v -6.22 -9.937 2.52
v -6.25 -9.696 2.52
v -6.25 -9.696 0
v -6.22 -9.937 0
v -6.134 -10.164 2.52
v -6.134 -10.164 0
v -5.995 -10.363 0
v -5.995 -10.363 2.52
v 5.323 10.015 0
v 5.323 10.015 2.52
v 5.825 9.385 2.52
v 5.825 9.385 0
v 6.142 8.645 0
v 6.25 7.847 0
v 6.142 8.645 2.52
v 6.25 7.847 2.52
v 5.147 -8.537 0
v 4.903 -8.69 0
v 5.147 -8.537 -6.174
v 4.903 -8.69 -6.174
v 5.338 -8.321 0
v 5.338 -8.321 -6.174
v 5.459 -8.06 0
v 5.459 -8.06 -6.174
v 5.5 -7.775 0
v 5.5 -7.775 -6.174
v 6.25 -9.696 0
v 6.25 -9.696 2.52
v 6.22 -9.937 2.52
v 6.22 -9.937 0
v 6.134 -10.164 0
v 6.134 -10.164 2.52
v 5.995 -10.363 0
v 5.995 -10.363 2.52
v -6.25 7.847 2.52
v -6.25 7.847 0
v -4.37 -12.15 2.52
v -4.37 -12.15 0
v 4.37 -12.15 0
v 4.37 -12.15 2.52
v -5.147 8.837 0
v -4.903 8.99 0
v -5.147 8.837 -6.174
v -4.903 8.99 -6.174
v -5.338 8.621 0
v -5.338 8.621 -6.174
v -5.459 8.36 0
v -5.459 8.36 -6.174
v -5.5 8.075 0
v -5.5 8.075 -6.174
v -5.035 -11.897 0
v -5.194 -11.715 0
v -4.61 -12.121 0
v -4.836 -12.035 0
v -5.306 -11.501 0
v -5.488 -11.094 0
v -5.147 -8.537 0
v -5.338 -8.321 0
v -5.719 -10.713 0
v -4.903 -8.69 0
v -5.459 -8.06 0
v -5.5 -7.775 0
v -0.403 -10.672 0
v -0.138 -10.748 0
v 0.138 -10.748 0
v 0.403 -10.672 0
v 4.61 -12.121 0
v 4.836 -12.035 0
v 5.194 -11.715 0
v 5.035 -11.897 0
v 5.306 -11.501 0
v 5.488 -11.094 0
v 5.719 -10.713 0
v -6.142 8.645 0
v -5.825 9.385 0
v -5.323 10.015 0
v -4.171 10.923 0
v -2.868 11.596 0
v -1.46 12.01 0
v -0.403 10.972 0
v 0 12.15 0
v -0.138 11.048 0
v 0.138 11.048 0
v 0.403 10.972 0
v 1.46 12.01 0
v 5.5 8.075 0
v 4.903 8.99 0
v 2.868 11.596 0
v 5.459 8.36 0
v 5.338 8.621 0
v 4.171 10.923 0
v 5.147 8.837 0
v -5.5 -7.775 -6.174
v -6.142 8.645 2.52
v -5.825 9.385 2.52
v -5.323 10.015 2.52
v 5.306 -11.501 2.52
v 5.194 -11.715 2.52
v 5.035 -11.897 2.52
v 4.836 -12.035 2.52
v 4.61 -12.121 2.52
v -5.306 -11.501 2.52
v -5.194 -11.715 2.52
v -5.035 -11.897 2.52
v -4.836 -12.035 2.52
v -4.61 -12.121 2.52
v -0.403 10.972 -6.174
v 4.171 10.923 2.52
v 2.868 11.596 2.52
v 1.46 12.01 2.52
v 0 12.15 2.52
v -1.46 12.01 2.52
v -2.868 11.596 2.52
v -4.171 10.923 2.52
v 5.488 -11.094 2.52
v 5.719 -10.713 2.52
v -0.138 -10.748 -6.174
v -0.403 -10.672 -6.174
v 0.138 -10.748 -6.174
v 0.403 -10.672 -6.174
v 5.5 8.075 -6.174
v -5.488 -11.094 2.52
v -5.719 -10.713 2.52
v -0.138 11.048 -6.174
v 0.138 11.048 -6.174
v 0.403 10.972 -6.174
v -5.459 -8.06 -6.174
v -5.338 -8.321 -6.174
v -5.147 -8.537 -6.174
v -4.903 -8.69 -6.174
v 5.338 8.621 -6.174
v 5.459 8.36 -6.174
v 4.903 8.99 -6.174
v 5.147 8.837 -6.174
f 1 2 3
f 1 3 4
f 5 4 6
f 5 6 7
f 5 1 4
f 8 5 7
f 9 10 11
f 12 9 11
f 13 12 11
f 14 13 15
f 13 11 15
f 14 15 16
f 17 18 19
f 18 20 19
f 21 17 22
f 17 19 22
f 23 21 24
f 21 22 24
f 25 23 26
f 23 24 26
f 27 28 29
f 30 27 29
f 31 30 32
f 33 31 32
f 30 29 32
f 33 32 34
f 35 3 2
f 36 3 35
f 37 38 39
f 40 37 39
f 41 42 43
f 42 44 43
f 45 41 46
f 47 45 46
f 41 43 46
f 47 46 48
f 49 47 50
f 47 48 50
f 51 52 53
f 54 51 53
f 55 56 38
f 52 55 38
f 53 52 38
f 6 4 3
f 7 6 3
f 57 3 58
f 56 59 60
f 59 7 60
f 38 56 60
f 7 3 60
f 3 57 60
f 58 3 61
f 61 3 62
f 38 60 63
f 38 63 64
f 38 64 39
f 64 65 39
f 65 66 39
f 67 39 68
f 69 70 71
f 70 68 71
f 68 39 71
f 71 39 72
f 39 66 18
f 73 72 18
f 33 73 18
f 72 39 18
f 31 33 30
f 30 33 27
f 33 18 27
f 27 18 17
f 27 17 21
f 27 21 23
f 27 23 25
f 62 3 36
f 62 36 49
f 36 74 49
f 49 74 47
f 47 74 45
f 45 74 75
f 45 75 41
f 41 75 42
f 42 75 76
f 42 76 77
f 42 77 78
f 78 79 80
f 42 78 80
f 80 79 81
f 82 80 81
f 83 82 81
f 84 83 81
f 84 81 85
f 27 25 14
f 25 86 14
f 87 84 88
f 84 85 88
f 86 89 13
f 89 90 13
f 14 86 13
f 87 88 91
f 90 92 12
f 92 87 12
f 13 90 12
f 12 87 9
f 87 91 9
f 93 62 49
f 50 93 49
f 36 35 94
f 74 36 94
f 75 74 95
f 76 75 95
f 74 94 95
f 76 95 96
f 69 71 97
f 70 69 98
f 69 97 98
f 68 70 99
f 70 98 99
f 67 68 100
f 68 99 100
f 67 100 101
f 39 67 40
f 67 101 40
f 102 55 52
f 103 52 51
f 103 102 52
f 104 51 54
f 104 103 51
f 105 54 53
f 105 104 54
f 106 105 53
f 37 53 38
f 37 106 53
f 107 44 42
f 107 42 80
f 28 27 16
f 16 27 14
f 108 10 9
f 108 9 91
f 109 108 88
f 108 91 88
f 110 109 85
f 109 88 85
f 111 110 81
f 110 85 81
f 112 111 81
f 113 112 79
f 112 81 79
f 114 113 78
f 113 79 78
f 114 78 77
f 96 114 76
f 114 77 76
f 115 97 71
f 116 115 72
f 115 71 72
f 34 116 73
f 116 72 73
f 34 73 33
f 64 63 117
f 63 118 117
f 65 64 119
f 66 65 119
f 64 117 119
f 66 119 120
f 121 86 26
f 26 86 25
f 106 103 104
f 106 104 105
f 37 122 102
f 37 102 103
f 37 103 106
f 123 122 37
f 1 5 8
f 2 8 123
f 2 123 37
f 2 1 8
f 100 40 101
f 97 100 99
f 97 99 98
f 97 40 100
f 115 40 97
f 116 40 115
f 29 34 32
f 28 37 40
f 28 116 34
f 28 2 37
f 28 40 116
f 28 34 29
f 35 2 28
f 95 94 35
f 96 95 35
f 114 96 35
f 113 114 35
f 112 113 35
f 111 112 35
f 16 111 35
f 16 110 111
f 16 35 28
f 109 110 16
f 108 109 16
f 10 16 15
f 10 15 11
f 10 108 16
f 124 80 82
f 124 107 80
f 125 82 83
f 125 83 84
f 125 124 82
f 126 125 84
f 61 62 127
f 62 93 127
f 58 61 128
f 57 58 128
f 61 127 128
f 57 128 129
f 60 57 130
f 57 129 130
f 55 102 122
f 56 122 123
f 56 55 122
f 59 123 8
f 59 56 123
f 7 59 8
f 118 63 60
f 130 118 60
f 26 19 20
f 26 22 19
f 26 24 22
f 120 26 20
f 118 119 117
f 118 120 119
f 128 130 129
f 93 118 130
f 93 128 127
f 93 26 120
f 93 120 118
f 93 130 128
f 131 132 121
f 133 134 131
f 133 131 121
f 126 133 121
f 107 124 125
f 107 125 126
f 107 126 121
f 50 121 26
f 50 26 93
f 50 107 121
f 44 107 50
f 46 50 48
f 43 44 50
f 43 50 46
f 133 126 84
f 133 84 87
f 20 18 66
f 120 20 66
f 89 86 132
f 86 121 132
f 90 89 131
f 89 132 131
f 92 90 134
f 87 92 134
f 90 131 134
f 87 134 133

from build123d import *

# Parameters (mm, degrees)
SKICA1_W                 = 12.5
SKICA1_H                 = 24.3
P_IDAT_VYSUNUT_M1_DEPTH  = 4.52
ODEBRAT_VYSUNUT_M1_DEPTH = 4.52
ODEBRAT_VYSUNUT_M2_DEPTH = 4.52
ZAOBLIT1_R               = 1
ZAOBLIT2_R               = 3
P_IDAT_VYSUNUT_M2_DEPTH  = 6.174
ZAOBLIT4_R               = 1
ODEBRAT_VYSUNUT_M3_DEPTH = 2


with BuildPart() as part:
    # Skica1 → Přidat vysunutím1 (new body)
    with BuildSketch(Plane.XY):
        Rectangle(SKICA1_W, SKICA1_H)
    extrude(amount=P_IDAT_VYSUNUT_M1_DEPTH)

    # Skica2 → Odebrat vysunutím1 (cut)
    with BuildSketch(Plane(origin=(0, 0, 0), x_dir=(-1, 0, 0), z_dir=(0, 0, -1))):
        with BuildLine():
            Line((-6.25, 12.15), (-6.25, 8.95))
            ThreePointArc((-6.25, 8.95), (-3.510786949, 11.303490134), (0, 12.15))
            Line((0, 12.15), (-6.25, 12.15))
        make_face()
        with BuildLine():
            Line((6.25, 12.15), (0, 12.15))
            ThreePointArc((0, 12.15), (3.510786949, 11.303490134), (6.25, 8.95))
            Line((6.25, 8.95), (6.25, 12.15))
        make_face()
    extrude(amount=-ODEBRAT_VYSUNUT_M1_DEPTH, mode=Mode.SUBTRACT)

    # Skica3 → Odebrat vysunutím2 (cut)
    with BuildSketch(Plane(origin=(0, 0, 0), x_dir=(-1, 0, 0), z_dir=(0, 0, -1))):
        with BuildLine():
            Line((-6.25, -10.10590929), (-6.25, -12.15))
            Line((-6.25, -12.15), (-5.130314287, -12.15))
            ThreePointArc((-5.130314287, -12.15), (-5.519629341, -11.034545119), (-6.25, -10.10590929))
        make_face()
        with BuildLine():
            Line((6.25, -12.15), (5.130314287, -12.15))
            ThreePointArc((5.130314287, -12.15), (5.519629341, -11.034545119), (6.25, -10.10590929))
            Line((6.25, -10.10590929), (6.25, -12.15))
        make_face()
    extrude(amount=-ODEBRAT_VYSUNUT_M2_DEPTH, mode=Mode.SUBTRACT)

    # Zaoblit1
    zaoblit1_edges = [part.edges().sort_by_distance(p)[0] for p in [
        (6.25, -10.10590929, 2.26),
        (5.130314287, -12.15, 2.26),
        (-5.130314287, -12.15, 2.26),
        (-6.25, -10.10590929, 2.26),
    ]]
    fillet(zaoblit1_edges, radius=ZAOBLIT1_R)

    # Zaoblit2
    zaoblit2_edges = [part.edges().sort_by_distance(p)[0] for p in [
        (6.25, 8.95, 2.26),
        (-6.25, 8.95, 2.26),
    ]]
    fillet(zaoblit2_edges, radius=ZAOBLIT2_R)

    # Skica4 → Přidat vysunutím2 (add)
    with BuildSketch(Plane(origin=(0, 0, 0), x_dir=(-1, 0, 0), z_dir=(0, 0, -1))):
        Polygon((0, 11.15), (-5.5, 8.726822139), (-5.5, -8.426822139), (0, -10.85), (5.5, -8.426822139), (5.5, 8.726822139), align=None)
    extrude(amount=P_IDAT_VYSUNUT_M2_DEPTH)

    # Zaoblit4
    zaoblit4_edges = [part.edges().sort_by_distance(p)[0] for p in [
        (0, -10.85, -3.087),
        (-5.5, -8.426822139, -3.087),
        (-5.5, 8.726822139, -3.087),
        (0, 11.15, -3.087),
        (5.5, 8.726822139, -3.087),
        (5.5, -8.426822139, -3.087),
    ]]
    fillet(zaoblit4_edges, radius=ZAOBLIT4_R)

    # Skica5 → Odebrat vysunutím3 (cut)
    with BuildSketch(Plane.XY.offset(4.52)):
        with BuildLine():
            Line((6.25, -9.69593403), (6.25, 7.846566614))
            ThreePointArc((6.25, 7.846566614), (6.008509797, 9.025813706), (5.322917532, 10.015209717))
            ThreePointArc((5.322917532, 10.015209717), (0, 12.15), (-5.322917532, 10.015209717))
            ThreePointArc((-5.322917532, 10.015209717), (-6.008509797, 9.025813706), (-6.25, 7.846566614))
            Line((-6.25, 7.846566614), (-6.25, -9.69593403))
            ThreePointArc((-6.25, -9.69593403), (-6.183994107, -10.053222441), (-5.994689983, -10.36334457))
            ThreePointArc((-5.994689983, -10.36334457), (-5.597278437, -10.899802086), (-5.306089821, -11.500578079))
            ThreePointArc((-5.306089821, -11.500578079), (-4.939390465, -11.971759721), (-4.369556313, -12.15))
            Line((-4.369556313, -12.15), (4.369556313, -12.15))
            ThreePointArc((4.369556313, -12.15), (4.939390465, -11.971759721), (5.306089821, -11.500578079))
            ThreePointArc((5.306089821, -11.500578079), (5.597278437, -10.899802086), (5.994689983, -10.36334457))
            ThreePointArc((5.994689983, -10.36334457), (6.183994107, -10.053222441), (6.25, -9.69593403))
        make_face()
    extrude(amount=-ODEBRAT_VYSUNUT_M3_DEPTH, mode=Mode.SUBTRACT)


solid = part.part
